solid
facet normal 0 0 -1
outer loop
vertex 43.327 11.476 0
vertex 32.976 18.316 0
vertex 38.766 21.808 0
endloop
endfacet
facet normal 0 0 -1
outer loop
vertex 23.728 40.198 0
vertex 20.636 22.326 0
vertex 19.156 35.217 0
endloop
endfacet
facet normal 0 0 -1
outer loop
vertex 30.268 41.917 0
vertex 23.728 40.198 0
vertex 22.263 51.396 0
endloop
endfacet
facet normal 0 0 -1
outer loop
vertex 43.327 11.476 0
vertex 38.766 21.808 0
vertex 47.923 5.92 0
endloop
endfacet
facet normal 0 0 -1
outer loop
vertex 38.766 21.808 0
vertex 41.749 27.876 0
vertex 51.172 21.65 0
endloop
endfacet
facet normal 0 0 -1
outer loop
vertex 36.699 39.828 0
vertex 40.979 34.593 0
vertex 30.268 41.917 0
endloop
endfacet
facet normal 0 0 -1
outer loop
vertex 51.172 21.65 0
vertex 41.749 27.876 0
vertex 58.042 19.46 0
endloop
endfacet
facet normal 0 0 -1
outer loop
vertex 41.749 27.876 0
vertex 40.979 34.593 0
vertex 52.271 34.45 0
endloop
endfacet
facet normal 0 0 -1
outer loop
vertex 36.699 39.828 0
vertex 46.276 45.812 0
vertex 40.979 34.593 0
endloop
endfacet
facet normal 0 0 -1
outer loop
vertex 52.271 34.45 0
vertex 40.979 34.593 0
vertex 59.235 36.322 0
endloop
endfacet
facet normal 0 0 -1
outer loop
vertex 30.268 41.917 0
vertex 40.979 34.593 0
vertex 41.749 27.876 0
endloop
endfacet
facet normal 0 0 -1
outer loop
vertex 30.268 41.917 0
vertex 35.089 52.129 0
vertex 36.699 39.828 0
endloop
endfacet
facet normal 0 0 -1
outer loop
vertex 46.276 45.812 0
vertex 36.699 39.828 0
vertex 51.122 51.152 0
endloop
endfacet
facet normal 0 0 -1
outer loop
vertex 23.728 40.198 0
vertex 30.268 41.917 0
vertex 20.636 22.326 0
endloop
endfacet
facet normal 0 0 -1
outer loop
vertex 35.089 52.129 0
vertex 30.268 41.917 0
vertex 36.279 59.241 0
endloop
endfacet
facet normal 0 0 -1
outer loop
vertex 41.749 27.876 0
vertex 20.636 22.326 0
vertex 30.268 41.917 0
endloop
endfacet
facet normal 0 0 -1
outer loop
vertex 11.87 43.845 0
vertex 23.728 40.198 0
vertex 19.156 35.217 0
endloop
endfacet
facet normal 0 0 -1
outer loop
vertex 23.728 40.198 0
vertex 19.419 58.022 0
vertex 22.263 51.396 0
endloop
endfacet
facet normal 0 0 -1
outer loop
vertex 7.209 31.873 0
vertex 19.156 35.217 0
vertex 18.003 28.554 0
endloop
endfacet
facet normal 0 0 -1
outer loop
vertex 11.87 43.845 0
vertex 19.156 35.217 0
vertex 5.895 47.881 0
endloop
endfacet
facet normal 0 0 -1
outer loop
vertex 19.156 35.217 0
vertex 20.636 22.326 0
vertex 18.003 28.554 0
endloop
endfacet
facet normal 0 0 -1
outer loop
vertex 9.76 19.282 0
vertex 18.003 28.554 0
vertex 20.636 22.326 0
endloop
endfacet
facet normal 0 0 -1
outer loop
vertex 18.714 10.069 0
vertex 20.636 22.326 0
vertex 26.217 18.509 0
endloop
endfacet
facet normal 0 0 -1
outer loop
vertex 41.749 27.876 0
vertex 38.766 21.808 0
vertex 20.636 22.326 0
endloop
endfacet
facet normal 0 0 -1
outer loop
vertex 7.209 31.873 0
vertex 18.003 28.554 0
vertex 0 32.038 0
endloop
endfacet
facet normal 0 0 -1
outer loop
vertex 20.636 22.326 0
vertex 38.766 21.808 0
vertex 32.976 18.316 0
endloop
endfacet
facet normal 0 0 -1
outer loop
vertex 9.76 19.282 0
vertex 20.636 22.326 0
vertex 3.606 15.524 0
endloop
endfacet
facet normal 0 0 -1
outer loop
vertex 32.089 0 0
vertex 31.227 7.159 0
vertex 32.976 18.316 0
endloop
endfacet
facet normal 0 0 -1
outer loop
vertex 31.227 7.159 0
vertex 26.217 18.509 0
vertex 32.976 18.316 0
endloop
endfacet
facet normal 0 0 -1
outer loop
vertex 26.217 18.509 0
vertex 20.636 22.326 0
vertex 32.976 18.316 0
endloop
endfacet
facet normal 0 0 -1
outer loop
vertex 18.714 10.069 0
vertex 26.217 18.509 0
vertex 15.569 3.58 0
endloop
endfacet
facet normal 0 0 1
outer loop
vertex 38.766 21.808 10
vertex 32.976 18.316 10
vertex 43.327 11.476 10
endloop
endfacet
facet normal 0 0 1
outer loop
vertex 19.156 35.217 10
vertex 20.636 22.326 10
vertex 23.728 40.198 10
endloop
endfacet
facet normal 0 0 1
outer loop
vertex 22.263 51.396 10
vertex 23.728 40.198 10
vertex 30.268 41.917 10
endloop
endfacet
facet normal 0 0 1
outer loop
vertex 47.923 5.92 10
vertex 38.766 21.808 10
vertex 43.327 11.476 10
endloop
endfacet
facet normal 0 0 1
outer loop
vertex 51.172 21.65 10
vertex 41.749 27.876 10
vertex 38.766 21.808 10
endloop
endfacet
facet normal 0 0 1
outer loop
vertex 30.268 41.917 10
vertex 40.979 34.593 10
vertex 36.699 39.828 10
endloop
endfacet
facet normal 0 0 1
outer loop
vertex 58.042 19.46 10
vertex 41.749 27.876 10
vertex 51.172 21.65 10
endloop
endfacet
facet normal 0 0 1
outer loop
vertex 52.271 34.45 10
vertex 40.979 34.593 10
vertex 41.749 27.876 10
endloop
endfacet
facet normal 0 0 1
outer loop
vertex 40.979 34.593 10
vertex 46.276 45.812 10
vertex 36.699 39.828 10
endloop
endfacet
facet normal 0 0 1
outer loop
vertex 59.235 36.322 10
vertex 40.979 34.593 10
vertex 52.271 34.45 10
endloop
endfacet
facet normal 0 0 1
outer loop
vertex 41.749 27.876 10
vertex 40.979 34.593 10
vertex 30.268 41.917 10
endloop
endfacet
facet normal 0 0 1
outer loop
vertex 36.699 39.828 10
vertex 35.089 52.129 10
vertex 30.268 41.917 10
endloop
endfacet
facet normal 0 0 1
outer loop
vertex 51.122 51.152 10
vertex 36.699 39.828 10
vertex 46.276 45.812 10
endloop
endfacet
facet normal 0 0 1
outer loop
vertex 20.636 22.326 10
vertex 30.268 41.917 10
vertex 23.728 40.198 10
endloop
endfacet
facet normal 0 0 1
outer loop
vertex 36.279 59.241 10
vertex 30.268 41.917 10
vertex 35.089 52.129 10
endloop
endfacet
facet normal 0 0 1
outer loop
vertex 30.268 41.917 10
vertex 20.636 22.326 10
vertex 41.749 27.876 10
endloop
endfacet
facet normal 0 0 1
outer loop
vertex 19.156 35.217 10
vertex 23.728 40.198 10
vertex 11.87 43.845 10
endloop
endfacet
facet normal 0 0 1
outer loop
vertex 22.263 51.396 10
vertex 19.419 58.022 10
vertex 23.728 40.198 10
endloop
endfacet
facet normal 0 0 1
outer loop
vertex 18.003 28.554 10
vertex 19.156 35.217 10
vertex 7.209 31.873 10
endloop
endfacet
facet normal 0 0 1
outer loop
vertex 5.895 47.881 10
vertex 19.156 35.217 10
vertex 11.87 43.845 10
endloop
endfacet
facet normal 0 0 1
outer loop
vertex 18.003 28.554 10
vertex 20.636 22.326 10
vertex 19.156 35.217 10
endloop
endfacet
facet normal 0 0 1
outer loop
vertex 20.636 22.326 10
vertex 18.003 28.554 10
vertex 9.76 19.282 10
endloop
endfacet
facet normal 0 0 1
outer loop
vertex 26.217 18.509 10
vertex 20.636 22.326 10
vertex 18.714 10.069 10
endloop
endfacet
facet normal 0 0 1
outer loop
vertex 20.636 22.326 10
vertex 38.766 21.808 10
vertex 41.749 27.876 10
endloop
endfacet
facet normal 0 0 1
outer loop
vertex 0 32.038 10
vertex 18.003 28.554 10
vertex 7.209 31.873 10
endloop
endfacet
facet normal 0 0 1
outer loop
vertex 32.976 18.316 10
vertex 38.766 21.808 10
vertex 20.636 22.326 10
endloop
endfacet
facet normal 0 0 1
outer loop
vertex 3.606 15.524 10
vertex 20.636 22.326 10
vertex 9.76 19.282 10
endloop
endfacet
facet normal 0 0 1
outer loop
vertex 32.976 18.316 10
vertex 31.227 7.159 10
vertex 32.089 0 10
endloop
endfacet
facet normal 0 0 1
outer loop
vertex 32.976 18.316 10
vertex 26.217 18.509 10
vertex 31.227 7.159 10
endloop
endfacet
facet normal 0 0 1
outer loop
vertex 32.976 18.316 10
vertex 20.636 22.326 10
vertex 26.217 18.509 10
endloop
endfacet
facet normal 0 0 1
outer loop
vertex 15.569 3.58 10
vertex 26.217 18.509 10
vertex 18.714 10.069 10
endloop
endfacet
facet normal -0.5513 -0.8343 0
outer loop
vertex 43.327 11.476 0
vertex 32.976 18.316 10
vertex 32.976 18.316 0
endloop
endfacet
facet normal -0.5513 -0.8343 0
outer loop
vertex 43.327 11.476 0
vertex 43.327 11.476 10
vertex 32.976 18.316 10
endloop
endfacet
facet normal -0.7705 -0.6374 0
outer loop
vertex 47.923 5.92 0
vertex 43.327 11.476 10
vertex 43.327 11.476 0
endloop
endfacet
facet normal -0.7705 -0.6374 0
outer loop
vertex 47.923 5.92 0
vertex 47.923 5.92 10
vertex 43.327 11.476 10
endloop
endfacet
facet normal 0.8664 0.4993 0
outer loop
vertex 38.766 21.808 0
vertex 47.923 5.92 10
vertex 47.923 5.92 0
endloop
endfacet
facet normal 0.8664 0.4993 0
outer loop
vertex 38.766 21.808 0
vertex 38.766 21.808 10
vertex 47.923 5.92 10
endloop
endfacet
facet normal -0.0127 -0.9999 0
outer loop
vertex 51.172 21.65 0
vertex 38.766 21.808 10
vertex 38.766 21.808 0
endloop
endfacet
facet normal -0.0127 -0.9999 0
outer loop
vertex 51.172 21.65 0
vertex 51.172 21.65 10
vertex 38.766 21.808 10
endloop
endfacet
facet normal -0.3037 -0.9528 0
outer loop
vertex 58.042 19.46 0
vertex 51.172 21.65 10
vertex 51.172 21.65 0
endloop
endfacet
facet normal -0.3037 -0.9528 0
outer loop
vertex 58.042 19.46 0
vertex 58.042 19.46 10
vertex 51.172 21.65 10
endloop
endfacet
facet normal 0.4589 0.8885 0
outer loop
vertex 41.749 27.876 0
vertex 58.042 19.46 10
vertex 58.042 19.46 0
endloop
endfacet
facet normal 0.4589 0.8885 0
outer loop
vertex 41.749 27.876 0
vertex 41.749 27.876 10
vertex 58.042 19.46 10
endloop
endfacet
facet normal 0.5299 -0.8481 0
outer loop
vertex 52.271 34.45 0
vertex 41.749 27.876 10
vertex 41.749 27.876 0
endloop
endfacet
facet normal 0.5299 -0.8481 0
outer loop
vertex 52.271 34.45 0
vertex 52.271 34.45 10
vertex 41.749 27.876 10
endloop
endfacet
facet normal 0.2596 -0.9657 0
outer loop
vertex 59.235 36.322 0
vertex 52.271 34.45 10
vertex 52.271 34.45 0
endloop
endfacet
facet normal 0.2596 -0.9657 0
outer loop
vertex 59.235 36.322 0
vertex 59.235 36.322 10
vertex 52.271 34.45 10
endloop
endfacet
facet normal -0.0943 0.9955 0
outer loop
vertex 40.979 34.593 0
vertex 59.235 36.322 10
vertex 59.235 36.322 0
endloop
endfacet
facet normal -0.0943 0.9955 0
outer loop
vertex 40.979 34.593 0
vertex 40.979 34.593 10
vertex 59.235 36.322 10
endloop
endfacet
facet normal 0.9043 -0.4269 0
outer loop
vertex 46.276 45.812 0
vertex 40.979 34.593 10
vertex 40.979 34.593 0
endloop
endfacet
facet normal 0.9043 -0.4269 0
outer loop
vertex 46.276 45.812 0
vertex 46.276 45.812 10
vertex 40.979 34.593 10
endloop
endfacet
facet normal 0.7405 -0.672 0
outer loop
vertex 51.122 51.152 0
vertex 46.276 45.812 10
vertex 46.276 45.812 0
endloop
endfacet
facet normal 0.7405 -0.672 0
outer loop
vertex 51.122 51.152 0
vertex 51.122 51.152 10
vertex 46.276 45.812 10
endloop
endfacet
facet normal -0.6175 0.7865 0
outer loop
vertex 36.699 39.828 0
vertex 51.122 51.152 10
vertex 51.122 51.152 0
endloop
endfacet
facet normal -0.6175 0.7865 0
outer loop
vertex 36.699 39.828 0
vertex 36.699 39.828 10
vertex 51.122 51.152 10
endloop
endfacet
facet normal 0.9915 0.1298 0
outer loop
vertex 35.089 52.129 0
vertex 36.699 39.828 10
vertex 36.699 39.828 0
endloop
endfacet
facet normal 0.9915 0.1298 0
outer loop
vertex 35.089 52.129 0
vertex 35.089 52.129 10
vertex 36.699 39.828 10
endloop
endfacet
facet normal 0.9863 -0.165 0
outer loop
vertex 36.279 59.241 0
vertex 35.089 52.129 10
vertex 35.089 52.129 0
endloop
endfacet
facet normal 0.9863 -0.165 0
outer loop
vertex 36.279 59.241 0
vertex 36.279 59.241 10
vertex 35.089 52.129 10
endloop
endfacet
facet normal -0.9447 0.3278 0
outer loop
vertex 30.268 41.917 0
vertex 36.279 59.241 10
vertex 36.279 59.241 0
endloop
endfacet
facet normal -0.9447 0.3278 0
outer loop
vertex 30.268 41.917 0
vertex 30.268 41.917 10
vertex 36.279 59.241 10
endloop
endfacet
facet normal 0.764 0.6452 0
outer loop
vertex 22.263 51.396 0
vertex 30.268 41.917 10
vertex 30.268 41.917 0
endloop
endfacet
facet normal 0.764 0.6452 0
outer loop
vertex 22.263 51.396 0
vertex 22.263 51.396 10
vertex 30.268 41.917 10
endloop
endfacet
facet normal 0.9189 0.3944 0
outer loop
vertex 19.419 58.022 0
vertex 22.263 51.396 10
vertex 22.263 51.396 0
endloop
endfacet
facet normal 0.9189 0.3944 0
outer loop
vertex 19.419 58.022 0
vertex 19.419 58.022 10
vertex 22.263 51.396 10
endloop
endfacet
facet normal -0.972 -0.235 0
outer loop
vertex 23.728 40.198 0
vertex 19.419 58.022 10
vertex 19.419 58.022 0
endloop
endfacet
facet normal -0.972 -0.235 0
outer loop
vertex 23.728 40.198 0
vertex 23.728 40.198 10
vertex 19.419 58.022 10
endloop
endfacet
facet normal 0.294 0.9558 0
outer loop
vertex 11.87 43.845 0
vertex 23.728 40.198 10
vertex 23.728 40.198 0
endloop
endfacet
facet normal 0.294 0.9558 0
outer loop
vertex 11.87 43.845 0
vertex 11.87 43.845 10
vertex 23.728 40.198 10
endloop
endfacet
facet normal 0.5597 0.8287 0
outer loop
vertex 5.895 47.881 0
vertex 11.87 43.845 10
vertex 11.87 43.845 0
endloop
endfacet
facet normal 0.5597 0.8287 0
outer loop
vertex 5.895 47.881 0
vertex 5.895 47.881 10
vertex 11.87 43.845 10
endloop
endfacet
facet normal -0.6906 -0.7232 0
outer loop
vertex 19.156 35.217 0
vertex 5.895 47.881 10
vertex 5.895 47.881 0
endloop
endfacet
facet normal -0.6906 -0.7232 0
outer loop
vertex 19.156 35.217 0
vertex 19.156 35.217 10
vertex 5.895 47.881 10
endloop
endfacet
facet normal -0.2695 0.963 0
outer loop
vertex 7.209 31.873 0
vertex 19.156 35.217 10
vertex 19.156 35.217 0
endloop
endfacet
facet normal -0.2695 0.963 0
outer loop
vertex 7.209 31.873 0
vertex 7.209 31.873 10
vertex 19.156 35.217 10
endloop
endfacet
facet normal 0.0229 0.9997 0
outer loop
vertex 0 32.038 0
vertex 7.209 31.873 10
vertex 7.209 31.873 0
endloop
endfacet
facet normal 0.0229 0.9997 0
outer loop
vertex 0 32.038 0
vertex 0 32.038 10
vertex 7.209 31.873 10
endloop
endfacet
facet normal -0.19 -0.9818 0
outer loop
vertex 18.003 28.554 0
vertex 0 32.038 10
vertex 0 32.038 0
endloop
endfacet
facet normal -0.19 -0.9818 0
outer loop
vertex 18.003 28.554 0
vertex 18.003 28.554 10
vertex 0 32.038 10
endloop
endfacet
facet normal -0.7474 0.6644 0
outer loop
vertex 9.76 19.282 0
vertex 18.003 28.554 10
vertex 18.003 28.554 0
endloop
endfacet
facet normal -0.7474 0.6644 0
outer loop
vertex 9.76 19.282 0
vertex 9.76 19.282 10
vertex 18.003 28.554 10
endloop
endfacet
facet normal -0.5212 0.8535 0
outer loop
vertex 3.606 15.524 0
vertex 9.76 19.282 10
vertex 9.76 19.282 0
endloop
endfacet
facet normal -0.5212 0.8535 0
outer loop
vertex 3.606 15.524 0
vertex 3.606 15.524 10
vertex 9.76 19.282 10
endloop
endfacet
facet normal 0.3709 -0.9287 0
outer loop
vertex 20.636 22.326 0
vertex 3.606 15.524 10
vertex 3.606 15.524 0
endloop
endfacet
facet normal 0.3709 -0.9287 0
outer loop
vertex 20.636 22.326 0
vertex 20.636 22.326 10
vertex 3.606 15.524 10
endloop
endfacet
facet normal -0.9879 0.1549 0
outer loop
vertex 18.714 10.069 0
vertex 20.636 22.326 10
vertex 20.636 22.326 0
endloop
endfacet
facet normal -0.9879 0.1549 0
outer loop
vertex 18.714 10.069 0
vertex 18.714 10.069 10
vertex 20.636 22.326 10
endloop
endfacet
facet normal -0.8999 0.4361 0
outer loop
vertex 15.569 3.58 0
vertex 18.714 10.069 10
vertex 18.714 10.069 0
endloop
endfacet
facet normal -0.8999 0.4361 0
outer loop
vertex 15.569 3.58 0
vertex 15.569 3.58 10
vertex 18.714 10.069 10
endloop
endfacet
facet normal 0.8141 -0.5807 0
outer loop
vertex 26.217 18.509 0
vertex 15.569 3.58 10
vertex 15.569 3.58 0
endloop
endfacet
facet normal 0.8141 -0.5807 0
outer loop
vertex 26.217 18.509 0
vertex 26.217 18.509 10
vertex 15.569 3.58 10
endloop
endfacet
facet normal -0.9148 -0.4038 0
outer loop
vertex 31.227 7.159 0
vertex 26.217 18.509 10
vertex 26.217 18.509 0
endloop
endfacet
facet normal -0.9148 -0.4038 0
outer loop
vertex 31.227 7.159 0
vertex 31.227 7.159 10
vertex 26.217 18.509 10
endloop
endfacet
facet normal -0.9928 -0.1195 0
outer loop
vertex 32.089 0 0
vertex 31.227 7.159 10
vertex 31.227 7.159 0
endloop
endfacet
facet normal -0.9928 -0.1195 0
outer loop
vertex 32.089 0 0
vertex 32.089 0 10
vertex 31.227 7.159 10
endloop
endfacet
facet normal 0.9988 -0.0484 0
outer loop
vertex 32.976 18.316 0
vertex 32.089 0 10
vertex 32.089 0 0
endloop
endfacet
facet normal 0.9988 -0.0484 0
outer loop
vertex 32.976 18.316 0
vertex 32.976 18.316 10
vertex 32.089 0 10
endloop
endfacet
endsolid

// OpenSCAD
$fn = 32;

// ----------------------------------------------------------------------
// Fan rotor section: 11 blades, 12 mm hub radius, 18 mm blades
// ----------------------------------------------------------------------

// --- parameters (mm) ---
profile_height = 10;      // extrusion height
profile_points = 33;      // points of the closed outline

profile = [[41.749, 27.876], [52.271, 34.45], [59.235, 36.322], [40.979, 34.593], [46.276, 45.812], [51.122, 51.152], [36.699, 39.828], [35.089, 52.129], [36.279, 59.241], [30.268, 41.917], [22.263, 51.396], [19.419, 58.022], [23.728, 40.198], [11.87, 43.845], [5.895, 47.881], [19.156, 35.217], [7.209, 31.873], [0, 32.038], [18.003, 28.554], [9.76, 19.282], [3.606, 15.524], [20.636, 22.326], [18.714, 10.069], [15.569, 3.58], [26.217, 18.509], [31.227, 7.159], [32.089, 0], [32.976, 18.316], [43.327, 11.476], [47.923, 5.92], [38.766, 21.808], [51.172, 21.65], [58.042, 19.46]];  // single closed polygon, 33 points, counter clockwise

// --- the one profile operation ---
linear_extrude(height = profile_height) polygon(points = profile);
